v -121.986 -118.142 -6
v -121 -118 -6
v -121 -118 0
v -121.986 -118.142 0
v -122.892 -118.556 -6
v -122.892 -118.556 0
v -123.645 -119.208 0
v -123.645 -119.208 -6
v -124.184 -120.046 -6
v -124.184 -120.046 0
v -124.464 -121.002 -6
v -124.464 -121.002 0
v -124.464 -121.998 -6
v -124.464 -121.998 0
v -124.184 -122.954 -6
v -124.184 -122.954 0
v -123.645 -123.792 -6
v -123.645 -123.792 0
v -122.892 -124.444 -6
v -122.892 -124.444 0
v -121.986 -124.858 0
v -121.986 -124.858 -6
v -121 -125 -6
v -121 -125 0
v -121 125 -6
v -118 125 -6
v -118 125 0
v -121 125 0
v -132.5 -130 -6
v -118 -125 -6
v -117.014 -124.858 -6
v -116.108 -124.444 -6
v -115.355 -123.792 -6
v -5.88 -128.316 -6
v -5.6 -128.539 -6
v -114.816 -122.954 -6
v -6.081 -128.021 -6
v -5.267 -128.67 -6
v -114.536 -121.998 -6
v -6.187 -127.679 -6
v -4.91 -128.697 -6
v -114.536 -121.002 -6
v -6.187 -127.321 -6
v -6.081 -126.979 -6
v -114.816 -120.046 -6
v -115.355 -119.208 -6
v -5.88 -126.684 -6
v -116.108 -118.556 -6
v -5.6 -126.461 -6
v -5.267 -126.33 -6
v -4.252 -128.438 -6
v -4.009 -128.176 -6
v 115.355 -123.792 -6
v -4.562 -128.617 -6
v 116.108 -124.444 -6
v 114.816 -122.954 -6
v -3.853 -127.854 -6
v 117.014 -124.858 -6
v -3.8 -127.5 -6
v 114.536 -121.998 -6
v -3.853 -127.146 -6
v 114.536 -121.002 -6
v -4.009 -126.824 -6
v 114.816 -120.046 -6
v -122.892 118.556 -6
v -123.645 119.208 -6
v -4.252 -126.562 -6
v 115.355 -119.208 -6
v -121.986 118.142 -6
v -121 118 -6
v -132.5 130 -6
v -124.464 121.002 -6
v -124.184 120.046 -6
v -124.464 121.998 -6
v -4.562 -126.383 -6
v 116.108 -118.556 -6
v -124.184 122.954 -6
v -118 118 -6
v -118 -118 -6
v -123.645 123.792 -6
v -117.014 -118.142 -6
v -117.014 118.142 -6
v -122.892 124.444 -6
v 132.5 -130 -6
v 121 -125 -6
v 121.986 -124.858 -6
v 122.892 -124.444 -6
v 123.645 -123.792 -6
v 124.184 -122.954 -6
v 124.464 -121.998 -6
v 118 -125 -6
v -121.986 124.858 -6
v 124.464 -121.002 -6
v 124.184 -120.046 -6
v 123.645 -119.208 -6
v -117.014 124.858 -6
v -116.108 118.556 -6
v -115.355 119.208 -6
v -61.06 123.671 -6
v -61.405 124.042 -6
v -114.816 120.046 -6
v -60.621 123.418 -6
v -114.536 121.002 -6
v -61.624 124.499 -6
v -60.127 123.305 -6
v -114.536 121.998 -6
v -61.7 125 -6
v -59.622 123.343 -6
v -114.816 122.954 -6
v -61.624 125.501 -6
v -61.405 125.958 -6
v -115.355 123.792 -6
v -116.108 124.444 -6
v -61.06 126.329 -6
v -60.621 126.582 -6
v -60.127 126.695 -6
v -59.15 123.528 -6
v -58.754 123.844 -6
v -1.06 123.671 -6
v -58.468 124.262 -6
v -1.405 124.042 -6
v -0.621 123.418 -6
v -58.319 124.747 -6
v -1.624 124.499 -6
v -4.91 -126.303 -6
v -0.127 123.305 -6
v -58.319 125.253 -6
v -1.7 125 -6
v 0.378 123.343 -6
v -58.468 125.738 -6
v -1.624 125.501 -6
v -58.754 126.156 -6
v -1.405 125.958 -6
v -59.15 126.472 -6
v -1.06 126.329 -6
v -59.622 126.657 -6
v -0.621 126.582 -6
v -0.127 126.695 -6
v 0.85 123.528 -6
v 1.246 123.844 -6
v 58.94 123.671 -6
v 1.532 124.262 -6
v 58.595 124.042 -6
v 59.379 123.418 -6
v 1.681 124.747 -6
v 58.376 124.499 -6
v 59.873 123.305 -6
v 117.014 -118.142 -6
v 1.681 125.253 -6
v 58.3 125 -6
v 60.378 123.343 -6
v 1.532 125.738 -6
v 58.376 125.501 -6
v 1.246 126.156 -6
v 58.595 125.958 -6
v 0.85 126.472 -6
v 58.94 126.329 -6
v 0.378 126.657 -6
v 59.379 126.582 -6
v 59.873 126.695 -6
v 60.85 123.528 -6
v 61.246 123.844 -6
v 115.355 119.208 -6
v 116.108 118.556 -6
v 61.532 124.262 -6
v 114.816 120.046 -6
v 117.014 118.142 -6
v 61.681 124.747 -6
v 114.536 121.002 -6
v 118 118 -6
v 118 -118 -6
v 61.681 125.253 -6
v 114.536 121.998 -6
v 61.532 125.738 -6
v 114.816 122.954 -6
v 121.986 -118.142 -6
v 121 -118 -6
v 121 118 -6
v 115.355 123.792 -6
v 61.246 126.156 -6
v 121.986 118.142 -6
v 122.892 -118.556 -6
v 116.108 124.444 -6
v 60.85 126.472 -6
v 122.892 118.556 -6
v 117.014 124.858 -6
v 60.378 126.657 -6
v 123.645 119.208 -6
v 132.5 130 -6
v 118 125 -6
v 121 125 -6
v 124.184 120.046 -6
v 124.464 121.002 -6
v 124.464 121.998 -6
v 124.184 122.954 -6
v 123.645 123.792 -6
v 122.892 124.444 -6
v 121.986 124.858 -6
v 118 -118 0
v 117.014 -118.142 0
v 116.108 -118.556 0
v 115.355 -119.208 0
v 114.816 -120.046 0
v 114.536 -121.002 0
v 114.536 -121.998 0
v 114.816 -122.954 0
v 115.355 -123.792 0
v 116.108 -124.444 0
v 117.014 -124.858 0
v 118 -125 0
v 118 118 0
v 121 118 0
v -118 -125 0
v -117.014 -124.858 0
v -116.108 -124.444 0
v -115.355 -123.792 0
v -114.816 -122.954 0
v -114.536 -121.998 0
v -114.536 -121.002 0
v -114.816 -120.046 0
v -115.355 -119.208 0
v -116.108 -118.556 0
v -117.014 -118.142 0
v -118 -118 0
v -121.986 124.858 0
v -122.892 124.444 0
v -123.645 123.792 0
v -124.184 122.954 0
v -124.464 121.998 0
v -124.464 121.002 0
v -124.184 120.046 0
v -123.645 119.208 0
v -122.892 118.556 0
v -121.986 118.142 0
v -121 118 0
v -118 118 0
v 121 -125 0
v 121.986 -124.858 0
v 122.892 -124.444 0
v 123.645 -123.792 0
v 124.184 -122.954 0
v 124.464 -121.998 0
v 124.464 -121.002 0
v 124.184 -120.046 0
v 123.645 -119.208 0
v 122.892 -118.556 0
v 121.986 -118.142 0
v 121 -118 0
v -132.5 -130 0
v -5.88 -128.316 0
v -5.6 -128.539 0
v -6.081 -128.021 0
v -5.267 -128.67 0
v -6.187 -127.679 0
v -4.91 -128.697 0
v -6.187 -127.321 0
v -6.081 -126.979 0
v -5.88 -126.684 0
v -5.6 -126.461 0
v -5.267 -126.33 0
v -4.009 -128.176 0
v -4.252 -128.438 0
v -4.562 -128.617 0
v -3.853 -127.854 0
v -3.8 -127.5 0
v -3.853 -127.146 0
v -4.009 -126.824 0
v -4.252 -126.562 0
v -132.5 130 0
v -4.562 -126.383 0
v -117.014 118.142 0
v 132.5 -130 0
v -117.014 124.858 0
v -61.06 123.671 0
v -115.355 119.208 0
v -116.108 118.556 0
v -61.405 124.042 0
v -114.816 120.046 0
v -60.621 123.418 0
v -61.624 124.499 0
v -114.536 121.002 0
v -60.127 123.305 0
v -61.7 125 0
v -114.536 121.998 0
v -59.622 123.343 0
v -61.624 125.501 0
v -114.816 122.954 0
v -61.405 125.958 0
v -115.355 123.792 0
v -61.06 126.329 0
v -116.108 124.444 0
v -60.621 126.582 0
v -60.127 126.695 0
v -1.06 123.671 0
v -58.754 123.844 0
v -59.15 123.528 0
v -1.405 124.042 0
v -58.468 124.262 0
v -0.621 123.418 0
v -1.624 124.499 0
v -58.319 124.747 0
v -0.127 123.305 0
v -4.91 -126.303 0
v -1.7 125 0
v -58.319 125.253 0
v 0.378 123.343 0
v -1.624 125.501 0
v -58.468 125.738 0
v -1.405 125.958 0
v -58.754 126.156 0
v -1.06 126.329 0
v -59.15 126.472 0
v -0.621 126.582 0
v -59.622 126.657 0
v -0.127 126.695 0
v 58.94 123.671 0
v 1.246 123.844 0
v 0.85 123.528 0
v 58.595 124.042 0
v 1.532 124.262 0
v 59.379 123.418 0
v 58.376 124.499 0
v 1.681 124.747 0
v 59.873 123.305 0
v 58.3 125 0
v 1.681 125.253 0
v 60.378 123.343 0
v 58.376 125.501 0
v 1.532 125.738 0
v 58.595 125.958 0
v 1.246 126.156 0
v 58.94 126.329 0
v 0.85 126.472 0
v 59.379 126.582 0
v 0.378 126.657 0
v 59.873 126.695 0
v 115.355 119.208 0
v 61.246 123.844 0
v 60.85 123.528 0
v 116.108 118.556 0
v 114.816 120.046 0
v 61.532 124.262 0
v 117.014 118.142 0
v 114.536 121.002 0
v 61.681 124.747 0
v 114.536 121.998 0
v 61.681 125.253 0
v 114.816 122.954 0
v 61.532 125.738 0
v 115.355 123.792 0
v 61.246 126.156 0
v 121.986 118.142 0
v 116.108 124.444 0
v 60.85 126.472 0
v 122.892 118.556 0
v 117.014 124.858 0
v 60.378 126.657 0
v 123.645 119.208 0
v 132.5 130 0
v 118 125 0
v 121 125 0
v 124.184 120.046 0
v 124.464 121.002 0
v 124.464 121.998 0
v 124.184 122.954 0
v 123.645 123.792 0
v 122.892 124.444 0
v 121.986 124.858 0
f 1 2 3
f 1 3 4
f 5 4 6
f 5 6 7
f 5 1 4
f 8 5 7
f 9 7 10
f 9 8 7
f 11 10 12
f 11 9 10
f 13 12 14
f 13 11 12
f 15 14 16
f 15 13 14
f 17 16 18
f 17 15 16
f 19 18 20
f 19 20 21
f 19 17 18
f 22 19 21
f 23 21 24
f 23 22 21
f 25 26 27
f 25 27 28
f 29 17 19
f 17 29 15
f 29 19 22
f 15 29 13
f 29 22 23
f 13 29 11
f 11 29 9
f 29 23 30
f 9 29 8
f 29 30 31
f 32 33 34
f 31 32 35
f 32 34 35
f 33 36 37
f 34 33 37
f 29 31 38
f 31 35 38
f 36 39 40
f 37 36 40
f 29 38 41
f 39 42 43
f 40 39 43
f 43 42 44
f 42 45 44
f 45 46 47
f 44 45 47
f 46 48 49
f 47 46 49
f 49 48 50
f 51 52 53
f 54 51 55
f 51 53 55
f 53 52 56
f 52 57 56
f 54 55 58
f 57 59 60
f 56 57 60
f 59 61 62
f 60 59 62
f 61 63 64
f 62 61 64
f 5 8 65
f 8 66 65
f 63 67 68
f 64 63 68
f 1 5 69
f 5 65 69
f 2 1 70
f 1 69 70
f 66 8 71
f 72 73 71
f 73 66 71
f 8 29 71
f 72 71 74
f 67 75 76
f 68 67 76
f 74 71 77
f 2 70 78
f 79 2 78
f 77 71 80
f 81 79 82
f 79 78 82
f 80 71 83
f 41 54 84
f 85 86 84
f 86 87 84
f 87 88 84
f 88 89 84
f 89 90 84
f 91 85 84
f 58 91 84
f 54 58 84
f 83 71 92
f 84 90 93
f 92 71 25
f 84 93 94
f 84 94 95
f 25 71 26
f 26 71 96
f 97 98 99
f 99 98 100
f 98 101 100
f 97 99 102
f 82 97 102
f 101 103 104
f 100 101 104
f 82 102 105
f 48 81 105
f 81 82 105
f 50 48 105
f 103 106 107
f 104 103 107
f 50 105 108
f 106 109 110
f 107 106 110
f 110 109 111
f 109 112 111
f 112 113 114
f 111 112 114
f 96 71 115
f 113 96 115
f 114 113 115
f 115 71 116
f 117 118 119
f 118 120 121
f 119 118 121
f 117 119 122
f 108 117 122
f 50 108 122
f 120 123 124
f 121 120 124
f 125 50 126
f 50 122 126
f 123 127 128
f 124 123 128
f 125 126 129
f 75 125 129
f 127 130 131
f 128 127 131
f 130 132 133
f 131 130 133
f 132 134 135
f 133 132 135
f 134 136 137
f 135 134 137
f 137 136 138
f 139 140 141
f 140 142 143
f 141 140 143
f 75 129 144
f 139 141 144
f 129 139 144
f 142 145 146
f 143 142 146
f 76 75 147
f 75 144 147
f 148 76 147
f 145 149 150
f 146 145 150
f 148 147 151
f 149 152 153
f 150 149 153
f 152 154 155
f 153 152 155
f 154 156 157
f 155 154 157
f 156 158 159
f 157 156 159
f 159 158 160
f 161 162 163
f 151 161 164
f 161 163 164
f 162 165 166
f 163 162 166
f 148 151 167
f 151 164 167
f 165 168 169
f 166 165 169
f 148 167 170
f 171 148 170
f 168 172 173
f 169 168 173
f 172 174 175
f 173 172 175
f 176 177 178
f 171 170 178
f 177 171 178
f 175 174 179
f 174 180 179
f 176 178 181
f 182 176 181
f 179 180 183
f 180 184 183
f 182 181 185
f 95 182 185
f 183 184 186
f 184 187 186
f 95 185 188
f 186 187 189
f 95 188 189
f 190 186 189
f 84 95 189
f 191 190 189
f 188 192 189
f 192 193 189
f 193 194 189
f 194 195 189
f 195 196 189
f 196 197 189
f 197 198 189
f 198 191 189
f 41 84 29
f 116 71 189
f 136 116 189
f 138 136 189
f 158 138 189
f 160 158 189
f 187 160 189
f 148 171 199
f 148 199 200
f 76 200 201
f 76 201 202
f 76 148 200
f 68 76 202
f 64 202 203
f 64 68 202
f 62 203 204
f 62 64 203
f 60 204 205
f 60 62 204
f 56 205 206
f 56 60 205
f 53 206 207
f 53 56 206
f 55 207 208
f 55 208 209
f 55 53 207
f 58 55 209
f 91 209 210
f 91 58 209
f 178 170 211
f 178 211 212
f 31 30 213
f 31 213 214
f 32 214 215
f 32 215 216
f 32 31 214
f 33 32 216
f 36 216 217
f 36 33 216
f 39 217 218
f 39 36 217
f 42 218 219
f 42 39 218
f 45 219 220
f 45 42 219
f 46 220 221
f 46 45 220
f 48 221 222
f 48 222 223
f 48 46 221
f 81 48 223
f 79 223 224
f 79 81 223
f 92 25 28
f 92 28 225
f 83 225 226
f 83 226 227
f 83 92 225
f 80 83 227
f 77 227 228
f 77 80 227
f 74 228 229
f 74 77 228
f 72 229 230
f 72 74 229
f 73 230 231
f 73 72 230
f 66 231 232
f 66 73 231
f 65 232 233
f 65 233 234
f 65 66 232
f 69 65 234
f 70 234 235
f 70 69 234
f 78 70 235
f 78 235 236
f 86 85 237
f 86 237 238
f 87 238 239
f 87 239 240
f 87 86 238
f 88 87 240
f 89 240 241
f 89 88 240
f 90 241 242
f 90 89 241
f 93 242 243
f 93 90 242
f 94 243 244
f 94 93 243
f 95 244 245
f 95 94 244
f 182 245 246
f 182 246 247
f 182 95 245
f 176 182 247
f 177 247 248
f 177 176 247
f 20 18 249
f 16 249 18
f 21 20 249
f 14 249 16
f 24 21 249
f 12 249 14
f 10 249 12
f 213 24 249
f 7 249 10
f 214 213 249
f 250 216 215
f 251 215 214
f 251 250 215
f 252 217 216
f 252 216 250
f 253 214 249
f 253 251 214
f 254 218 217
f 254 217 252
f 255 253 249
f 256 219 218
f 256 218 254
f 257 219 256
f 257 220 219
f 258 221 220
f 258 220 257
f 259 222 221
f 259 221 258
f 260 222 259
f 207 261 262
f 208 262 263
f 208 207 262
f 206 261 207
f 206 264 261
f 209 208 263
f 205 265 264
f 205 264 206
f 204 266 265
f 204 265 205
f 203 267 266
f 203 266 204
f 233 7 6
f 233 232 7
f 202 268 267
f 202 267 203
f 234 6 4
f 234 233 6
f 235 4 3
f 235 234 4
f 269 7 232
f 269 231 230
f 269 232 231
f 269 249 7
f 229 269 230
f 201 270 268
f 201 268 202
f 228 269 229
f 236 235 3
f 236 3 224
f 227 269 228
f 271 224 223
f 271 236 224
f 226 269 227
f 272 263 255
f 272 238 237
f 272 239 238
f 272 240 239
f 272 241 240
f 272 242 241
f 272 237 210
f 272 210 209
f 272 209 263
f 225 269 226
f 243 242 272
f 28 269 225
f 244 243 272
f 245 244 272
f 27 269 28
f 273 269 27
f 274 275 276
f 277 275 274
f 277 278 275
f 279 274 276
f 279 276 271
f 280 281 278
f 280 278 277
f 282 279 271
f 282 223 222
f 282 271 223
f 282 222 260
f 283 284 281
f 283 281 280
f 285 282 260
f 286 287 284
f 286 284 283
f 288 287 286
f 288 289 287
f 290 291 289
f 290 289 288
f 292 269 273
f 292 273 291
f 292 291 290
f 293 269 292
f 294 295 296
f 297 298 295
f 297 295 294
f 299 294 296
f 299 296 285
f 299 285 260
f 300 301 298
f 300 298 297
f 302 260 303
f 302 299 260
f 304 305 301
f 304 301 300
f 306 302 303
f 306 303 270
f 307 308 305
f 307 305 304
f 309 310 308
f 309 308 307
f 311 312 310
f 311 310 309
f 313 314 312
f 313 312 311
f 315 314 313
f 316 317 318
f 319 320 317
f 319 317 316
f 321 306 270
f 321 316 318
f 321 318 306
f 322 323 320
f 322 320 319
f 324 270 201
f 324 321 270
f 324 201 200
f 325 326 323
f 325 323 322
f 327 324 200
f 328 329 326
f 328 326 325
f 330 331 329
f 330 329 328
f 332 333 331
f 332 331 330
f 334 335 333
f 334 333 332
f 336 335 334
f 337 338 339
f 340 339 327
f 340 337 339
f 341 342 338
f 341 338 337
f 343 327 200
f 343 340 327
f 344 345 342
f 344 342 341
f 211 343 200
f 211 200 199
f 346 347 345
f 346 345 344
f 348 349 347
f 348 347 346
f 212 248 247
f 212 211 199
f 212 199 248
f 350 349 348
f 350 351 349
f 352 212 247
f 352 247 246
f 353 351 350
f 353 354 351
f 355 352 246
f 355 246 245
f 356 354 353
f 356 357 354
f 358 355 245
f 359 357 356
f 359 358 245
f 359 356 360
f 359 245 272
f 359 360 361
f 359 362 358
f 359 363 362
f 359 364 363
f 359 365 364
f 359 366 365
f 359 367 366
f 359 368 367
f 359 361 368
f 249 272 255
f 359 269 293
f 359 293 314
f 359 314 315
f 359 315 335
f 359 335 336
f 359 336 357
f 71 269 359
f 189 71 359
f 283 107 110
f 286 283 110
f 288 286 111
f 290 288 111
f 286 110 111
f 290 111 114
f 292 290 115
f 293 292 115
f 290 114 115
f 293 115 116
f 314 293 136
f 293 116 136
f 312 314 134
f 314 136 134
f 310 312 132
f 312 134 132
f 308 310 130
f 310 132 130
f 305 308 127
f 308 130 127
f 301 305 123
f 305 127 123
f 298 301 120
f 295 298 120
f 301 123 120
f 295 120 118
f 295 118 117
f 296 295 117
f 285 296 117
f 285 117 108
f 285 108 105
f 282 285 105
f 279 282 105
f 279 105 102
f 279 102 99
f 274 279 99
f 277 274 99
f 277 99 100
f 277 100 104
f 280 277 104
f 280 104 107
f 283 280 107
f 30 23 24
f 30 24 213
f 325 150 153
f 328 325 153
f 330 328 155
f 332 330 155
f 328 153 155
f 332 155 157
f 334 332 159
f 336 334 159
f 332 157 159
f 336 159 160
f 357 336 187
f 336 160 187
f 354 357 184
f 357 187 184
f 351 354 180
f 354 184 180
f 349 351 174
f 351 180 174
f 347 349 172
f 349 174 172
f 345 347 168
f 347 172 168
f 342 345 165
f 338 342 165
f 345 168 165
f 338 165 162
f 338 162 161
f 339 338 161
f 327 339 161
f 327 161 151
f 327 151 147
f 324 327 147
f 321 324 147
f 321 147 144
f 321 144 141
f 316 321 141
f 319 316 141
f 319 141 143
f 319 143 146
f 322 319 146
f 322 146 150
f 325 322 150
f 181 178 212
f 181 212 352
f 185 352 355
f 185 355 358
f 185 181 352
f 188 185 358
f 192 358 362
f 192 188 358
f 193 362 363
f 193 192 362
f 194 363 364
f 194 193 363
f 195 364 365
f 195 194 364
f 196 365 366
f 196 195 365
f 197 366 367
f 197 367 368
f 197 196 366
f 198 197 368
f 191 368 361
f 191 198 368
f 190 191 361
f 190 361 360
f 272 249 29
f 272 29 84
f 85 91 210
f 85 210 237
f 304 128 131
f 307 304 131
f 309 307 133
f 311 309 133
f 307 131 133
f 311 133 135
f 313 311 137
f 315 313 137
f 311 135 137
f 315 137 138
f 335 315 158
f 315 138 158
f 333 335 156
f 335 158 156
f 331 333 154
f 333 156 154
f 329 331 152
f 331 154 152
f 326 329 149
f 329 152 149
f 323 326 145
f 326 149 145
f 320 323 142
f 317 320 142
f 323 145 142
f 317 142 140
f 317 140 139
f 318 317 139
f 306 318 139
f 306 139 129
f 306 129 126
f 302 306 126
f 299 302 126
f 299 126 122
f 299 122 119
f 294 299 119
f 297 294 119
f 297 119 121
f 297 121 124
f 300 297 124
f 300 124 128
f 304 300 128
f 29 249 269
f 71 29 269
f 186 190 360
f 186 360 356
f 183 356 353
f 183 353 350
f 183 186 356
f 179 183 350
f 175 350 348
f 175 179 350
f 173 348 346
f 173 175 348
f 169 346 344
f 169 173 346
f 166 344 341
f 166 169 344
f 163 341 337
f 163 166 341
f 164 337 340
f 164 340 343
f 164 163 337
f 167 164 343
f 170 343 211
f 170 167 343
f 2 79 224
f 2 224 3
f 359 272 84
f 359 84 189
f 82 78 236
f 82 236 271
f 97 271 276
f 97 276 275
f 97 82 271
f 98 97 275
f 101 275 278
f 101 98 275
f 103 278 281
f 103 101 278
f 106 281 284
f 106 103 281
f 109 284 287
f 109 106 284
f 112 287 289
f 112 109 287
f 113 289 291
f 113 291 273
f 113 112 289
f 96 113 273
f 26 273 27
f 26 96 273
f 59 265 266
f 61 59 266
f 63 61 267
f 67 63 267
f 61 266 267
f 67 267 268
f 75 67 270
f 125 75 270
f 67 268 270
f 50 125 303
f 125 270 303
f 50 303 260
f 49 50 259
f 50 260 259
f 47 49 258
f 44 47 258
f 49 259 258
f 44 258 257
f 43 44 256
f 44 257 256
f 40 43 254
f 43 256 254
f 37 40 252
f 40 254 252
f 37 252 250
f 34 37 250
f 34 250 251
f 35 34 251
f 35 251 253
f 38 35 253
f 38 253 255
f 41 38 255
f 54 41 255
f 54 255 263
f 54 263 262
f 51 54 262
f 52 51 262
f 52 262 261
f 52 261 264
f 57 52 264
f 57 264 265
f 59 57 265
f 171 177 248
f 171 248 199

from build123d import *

# Parameters (mm, degrees)
CROQUIS1_W                      = 265
CROQUIS1_H                      = 260
BRIDA_BASE1_DEPTH               = 6
RANURA_START                    = -6
RANURA_DE_MARGEN_PARA_M61_DEPTH = 6
CROQUIS5_R                      = 1.2
CORTAR_EXTRUIR1_DEPTH           = 186.72089274
TALADRO_DE_MARGEN_PARA_M31_D    = 3.4


# Read off the part's stored shape, not the designer's step: Ranura de margen para M61
# Sheet-metal steps are written as plain solids
with BuildPart() as part:
    # Croquis1 → Brida base1 (new body)
    with BuildSketch(Plane.XY):
        Rectangle(CROQUIS1_W, CROQUIS1_H)
    extrude(amount=-BRIDA_BASE1_DEPTH)

    # Ranura de margen para M61 outline → Ranura de margen para M61 (cut)
    with BuildSketch(Plane.XY.offset(RANURA_START)):
        with BuildLine():
            ThreePointArc((-118, 118), (-114.5, 121.5), (-118, 125))
            Line((-118, 125), (-121, 125))
            ThreePointArc((-121, 125), (-124.5, 121.5), (-121, 118))
            Line((-121, 118), (-118, 118))
        make_face()
        with BuildLine():
            ThreePointArc((118, 125), (114.5, 121.5), (118, 118))
            Line((118, 118), (121, 118))
            ThreePointArc((121, 118), (124.5, 121.5), (121, 125))
            Line((121, 125), (118, 125))
        make_face()
        with BuildLine():
            ThreePointArc((121, -125), (124.5, -121.5), (121, -118))
            Line((121, -118), (118, -118))
            ThreePointArc((118, -118), (114.5, -121.5), (118, -125))
            Line((118, -125), (121, -125))
        make_face()
        with BuildLine():
            ThreePointArc((-121, -118), (-124.5, -121.5), (-121, -125))
            Line((-121, -125), (-118, -125))
            ThreePointArc((-118, -125), (-114.5, -121.5), (-118, -118))
            Line((-118, -118), (-121, -118))
        make_face()
    extrude(amount=RANURA_DE_MARGEN_PARA_M61_DEPTH, mode=Mode.SUBTRACT)

    # Croquis5 → Cortar-Extruir1 (cut, through all)
    with BuildSketch(Plane.XY):
        with Locations((-5, -127.5)):
            Circle(CROQUIS5_R)
    extrude(amount=-CORTAR_EXTRUIR1_DEPTH, mode=Mode.SUBTRACT)

    # Taladro de margen para M31 (through all)
    with Locations(Plane.XY):
        with Locations((60, 125), (0, 125), (-60, 125)):
            Hole(TALADRO_DE_MARGEN_PARA_M31_D / 2)


solid = part.part
